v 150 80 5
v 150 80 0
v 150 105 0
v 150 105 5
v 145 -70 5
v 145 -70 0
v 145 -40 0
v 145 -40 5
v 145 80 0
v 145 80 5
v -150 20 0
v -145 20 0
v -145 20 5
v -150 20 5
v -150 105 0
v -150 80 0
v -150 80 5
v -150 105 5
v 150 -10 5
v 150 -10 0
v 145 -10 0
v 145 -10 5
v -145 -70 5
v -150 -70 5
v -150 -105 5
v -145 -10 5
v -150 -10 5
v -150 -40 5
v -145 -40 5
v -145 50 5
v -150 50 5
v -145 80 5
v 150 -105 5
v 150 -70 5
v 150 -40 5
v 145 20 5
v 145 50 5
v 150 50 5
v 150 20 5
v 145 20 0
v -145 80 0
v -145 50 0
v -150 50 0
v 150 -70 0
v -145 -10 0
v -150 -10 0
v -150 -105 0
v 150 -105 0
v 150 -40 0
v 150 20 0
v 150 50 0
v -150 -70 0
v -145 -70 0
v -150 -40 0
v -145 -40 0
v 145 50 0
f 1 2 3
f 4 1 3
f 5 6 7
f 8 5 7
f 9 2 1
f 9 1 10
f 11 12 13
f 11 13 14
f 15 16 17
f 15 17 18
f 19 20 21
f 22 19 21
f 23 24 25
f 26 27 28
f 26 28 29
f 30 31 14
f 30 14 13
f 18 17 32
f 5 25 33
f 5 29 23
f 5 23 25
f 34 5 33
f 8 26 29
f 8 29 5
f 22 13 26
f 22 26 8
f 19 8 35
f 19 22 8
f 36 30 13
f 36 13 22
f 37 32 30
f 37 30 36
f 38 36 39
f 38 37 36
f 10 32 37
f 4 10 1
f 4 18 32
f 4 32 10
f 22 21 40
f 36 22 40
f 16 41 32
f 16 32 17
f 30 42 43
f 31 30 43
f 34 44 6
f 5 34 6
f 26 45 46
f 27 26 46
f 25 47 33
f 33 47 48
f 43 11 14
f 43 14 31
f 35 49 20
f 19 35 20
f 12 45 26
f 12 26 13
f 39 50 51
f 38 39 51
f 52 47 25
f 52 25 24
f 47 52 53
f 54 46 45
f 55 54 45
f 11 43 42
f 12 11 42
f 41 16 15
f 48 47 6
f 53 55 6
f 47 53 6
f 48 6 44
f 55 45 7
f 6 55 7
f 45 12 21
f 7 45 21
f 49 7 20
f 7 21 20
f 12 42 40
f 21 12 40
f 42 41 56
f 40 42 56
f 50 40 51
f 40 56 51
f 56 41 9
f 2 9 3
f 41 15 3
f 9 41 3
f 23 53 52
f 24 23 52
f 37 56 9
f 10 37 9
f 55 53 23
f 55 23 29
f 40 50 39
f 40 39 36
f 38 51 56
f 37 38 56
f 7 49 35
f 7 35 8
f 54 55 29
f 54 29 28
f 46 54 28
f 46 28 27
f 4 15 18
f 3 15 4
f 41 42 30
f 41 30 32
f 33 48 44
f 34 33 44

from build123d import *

# Parameters (mm, degrees)
SKETCH1_W           = 300
SKETCH1_H           = 210
BOSS_EXTRUDE1_DEPTH = 5
SKETCH2_W           = 67.619836516
SKETCH2_H           = 30
SKETCH2_W_2         = 72.619836516
SKETCH2_W_3         = 53.212613818
CUT_EXTRUDE1_DEPTH  = 6


with BuildPart() as part:
    # Sketch1 → Boss-Extrude1 (new body)
    with BuildSketch(Plane.XY):
        Rectangle(SKETCH1_W, SKETCH1_H)
    extrude(amount=BOSS_EXTRUDE1_DEPTH)

    # Sketch2 → Cut-Extrude1 (cut, through all)
    with BuildSketch(Plane(origin=(0, 0, 0), x_dir=(-1, 0, 0), z_dir=(0, 0, -1))):
        with Locations((-178.809918258, 65)):
            Rectangle(SKETCH2_W, SKETCH2_H)
        with Locations((-181.309918258, 5)):
            Rectangle(SKETCH2_W_2, SKETCH2_H)
        with Locations((-181.309918258, -55)):
            Rectangle(SKETCH2_W_2, SKETCH2_H)
        with Locations((171.606306909, 65)):
            Rectangle(SKETCH2_W_3, SKETCH2_H)
        with Locations((181.309918258, 5)):
            Rectangle(SKETCH2_W_2, SKETCH2_H)
        with Locations((181.309918258, -55)):
            Rectangle(SKETCH2_W_2, SKETCH2_H)
    extrude(amount=-CUT_EXTRUDE1_DEPTH, mode=Mode.SUBTRACT)


solid = part.part
